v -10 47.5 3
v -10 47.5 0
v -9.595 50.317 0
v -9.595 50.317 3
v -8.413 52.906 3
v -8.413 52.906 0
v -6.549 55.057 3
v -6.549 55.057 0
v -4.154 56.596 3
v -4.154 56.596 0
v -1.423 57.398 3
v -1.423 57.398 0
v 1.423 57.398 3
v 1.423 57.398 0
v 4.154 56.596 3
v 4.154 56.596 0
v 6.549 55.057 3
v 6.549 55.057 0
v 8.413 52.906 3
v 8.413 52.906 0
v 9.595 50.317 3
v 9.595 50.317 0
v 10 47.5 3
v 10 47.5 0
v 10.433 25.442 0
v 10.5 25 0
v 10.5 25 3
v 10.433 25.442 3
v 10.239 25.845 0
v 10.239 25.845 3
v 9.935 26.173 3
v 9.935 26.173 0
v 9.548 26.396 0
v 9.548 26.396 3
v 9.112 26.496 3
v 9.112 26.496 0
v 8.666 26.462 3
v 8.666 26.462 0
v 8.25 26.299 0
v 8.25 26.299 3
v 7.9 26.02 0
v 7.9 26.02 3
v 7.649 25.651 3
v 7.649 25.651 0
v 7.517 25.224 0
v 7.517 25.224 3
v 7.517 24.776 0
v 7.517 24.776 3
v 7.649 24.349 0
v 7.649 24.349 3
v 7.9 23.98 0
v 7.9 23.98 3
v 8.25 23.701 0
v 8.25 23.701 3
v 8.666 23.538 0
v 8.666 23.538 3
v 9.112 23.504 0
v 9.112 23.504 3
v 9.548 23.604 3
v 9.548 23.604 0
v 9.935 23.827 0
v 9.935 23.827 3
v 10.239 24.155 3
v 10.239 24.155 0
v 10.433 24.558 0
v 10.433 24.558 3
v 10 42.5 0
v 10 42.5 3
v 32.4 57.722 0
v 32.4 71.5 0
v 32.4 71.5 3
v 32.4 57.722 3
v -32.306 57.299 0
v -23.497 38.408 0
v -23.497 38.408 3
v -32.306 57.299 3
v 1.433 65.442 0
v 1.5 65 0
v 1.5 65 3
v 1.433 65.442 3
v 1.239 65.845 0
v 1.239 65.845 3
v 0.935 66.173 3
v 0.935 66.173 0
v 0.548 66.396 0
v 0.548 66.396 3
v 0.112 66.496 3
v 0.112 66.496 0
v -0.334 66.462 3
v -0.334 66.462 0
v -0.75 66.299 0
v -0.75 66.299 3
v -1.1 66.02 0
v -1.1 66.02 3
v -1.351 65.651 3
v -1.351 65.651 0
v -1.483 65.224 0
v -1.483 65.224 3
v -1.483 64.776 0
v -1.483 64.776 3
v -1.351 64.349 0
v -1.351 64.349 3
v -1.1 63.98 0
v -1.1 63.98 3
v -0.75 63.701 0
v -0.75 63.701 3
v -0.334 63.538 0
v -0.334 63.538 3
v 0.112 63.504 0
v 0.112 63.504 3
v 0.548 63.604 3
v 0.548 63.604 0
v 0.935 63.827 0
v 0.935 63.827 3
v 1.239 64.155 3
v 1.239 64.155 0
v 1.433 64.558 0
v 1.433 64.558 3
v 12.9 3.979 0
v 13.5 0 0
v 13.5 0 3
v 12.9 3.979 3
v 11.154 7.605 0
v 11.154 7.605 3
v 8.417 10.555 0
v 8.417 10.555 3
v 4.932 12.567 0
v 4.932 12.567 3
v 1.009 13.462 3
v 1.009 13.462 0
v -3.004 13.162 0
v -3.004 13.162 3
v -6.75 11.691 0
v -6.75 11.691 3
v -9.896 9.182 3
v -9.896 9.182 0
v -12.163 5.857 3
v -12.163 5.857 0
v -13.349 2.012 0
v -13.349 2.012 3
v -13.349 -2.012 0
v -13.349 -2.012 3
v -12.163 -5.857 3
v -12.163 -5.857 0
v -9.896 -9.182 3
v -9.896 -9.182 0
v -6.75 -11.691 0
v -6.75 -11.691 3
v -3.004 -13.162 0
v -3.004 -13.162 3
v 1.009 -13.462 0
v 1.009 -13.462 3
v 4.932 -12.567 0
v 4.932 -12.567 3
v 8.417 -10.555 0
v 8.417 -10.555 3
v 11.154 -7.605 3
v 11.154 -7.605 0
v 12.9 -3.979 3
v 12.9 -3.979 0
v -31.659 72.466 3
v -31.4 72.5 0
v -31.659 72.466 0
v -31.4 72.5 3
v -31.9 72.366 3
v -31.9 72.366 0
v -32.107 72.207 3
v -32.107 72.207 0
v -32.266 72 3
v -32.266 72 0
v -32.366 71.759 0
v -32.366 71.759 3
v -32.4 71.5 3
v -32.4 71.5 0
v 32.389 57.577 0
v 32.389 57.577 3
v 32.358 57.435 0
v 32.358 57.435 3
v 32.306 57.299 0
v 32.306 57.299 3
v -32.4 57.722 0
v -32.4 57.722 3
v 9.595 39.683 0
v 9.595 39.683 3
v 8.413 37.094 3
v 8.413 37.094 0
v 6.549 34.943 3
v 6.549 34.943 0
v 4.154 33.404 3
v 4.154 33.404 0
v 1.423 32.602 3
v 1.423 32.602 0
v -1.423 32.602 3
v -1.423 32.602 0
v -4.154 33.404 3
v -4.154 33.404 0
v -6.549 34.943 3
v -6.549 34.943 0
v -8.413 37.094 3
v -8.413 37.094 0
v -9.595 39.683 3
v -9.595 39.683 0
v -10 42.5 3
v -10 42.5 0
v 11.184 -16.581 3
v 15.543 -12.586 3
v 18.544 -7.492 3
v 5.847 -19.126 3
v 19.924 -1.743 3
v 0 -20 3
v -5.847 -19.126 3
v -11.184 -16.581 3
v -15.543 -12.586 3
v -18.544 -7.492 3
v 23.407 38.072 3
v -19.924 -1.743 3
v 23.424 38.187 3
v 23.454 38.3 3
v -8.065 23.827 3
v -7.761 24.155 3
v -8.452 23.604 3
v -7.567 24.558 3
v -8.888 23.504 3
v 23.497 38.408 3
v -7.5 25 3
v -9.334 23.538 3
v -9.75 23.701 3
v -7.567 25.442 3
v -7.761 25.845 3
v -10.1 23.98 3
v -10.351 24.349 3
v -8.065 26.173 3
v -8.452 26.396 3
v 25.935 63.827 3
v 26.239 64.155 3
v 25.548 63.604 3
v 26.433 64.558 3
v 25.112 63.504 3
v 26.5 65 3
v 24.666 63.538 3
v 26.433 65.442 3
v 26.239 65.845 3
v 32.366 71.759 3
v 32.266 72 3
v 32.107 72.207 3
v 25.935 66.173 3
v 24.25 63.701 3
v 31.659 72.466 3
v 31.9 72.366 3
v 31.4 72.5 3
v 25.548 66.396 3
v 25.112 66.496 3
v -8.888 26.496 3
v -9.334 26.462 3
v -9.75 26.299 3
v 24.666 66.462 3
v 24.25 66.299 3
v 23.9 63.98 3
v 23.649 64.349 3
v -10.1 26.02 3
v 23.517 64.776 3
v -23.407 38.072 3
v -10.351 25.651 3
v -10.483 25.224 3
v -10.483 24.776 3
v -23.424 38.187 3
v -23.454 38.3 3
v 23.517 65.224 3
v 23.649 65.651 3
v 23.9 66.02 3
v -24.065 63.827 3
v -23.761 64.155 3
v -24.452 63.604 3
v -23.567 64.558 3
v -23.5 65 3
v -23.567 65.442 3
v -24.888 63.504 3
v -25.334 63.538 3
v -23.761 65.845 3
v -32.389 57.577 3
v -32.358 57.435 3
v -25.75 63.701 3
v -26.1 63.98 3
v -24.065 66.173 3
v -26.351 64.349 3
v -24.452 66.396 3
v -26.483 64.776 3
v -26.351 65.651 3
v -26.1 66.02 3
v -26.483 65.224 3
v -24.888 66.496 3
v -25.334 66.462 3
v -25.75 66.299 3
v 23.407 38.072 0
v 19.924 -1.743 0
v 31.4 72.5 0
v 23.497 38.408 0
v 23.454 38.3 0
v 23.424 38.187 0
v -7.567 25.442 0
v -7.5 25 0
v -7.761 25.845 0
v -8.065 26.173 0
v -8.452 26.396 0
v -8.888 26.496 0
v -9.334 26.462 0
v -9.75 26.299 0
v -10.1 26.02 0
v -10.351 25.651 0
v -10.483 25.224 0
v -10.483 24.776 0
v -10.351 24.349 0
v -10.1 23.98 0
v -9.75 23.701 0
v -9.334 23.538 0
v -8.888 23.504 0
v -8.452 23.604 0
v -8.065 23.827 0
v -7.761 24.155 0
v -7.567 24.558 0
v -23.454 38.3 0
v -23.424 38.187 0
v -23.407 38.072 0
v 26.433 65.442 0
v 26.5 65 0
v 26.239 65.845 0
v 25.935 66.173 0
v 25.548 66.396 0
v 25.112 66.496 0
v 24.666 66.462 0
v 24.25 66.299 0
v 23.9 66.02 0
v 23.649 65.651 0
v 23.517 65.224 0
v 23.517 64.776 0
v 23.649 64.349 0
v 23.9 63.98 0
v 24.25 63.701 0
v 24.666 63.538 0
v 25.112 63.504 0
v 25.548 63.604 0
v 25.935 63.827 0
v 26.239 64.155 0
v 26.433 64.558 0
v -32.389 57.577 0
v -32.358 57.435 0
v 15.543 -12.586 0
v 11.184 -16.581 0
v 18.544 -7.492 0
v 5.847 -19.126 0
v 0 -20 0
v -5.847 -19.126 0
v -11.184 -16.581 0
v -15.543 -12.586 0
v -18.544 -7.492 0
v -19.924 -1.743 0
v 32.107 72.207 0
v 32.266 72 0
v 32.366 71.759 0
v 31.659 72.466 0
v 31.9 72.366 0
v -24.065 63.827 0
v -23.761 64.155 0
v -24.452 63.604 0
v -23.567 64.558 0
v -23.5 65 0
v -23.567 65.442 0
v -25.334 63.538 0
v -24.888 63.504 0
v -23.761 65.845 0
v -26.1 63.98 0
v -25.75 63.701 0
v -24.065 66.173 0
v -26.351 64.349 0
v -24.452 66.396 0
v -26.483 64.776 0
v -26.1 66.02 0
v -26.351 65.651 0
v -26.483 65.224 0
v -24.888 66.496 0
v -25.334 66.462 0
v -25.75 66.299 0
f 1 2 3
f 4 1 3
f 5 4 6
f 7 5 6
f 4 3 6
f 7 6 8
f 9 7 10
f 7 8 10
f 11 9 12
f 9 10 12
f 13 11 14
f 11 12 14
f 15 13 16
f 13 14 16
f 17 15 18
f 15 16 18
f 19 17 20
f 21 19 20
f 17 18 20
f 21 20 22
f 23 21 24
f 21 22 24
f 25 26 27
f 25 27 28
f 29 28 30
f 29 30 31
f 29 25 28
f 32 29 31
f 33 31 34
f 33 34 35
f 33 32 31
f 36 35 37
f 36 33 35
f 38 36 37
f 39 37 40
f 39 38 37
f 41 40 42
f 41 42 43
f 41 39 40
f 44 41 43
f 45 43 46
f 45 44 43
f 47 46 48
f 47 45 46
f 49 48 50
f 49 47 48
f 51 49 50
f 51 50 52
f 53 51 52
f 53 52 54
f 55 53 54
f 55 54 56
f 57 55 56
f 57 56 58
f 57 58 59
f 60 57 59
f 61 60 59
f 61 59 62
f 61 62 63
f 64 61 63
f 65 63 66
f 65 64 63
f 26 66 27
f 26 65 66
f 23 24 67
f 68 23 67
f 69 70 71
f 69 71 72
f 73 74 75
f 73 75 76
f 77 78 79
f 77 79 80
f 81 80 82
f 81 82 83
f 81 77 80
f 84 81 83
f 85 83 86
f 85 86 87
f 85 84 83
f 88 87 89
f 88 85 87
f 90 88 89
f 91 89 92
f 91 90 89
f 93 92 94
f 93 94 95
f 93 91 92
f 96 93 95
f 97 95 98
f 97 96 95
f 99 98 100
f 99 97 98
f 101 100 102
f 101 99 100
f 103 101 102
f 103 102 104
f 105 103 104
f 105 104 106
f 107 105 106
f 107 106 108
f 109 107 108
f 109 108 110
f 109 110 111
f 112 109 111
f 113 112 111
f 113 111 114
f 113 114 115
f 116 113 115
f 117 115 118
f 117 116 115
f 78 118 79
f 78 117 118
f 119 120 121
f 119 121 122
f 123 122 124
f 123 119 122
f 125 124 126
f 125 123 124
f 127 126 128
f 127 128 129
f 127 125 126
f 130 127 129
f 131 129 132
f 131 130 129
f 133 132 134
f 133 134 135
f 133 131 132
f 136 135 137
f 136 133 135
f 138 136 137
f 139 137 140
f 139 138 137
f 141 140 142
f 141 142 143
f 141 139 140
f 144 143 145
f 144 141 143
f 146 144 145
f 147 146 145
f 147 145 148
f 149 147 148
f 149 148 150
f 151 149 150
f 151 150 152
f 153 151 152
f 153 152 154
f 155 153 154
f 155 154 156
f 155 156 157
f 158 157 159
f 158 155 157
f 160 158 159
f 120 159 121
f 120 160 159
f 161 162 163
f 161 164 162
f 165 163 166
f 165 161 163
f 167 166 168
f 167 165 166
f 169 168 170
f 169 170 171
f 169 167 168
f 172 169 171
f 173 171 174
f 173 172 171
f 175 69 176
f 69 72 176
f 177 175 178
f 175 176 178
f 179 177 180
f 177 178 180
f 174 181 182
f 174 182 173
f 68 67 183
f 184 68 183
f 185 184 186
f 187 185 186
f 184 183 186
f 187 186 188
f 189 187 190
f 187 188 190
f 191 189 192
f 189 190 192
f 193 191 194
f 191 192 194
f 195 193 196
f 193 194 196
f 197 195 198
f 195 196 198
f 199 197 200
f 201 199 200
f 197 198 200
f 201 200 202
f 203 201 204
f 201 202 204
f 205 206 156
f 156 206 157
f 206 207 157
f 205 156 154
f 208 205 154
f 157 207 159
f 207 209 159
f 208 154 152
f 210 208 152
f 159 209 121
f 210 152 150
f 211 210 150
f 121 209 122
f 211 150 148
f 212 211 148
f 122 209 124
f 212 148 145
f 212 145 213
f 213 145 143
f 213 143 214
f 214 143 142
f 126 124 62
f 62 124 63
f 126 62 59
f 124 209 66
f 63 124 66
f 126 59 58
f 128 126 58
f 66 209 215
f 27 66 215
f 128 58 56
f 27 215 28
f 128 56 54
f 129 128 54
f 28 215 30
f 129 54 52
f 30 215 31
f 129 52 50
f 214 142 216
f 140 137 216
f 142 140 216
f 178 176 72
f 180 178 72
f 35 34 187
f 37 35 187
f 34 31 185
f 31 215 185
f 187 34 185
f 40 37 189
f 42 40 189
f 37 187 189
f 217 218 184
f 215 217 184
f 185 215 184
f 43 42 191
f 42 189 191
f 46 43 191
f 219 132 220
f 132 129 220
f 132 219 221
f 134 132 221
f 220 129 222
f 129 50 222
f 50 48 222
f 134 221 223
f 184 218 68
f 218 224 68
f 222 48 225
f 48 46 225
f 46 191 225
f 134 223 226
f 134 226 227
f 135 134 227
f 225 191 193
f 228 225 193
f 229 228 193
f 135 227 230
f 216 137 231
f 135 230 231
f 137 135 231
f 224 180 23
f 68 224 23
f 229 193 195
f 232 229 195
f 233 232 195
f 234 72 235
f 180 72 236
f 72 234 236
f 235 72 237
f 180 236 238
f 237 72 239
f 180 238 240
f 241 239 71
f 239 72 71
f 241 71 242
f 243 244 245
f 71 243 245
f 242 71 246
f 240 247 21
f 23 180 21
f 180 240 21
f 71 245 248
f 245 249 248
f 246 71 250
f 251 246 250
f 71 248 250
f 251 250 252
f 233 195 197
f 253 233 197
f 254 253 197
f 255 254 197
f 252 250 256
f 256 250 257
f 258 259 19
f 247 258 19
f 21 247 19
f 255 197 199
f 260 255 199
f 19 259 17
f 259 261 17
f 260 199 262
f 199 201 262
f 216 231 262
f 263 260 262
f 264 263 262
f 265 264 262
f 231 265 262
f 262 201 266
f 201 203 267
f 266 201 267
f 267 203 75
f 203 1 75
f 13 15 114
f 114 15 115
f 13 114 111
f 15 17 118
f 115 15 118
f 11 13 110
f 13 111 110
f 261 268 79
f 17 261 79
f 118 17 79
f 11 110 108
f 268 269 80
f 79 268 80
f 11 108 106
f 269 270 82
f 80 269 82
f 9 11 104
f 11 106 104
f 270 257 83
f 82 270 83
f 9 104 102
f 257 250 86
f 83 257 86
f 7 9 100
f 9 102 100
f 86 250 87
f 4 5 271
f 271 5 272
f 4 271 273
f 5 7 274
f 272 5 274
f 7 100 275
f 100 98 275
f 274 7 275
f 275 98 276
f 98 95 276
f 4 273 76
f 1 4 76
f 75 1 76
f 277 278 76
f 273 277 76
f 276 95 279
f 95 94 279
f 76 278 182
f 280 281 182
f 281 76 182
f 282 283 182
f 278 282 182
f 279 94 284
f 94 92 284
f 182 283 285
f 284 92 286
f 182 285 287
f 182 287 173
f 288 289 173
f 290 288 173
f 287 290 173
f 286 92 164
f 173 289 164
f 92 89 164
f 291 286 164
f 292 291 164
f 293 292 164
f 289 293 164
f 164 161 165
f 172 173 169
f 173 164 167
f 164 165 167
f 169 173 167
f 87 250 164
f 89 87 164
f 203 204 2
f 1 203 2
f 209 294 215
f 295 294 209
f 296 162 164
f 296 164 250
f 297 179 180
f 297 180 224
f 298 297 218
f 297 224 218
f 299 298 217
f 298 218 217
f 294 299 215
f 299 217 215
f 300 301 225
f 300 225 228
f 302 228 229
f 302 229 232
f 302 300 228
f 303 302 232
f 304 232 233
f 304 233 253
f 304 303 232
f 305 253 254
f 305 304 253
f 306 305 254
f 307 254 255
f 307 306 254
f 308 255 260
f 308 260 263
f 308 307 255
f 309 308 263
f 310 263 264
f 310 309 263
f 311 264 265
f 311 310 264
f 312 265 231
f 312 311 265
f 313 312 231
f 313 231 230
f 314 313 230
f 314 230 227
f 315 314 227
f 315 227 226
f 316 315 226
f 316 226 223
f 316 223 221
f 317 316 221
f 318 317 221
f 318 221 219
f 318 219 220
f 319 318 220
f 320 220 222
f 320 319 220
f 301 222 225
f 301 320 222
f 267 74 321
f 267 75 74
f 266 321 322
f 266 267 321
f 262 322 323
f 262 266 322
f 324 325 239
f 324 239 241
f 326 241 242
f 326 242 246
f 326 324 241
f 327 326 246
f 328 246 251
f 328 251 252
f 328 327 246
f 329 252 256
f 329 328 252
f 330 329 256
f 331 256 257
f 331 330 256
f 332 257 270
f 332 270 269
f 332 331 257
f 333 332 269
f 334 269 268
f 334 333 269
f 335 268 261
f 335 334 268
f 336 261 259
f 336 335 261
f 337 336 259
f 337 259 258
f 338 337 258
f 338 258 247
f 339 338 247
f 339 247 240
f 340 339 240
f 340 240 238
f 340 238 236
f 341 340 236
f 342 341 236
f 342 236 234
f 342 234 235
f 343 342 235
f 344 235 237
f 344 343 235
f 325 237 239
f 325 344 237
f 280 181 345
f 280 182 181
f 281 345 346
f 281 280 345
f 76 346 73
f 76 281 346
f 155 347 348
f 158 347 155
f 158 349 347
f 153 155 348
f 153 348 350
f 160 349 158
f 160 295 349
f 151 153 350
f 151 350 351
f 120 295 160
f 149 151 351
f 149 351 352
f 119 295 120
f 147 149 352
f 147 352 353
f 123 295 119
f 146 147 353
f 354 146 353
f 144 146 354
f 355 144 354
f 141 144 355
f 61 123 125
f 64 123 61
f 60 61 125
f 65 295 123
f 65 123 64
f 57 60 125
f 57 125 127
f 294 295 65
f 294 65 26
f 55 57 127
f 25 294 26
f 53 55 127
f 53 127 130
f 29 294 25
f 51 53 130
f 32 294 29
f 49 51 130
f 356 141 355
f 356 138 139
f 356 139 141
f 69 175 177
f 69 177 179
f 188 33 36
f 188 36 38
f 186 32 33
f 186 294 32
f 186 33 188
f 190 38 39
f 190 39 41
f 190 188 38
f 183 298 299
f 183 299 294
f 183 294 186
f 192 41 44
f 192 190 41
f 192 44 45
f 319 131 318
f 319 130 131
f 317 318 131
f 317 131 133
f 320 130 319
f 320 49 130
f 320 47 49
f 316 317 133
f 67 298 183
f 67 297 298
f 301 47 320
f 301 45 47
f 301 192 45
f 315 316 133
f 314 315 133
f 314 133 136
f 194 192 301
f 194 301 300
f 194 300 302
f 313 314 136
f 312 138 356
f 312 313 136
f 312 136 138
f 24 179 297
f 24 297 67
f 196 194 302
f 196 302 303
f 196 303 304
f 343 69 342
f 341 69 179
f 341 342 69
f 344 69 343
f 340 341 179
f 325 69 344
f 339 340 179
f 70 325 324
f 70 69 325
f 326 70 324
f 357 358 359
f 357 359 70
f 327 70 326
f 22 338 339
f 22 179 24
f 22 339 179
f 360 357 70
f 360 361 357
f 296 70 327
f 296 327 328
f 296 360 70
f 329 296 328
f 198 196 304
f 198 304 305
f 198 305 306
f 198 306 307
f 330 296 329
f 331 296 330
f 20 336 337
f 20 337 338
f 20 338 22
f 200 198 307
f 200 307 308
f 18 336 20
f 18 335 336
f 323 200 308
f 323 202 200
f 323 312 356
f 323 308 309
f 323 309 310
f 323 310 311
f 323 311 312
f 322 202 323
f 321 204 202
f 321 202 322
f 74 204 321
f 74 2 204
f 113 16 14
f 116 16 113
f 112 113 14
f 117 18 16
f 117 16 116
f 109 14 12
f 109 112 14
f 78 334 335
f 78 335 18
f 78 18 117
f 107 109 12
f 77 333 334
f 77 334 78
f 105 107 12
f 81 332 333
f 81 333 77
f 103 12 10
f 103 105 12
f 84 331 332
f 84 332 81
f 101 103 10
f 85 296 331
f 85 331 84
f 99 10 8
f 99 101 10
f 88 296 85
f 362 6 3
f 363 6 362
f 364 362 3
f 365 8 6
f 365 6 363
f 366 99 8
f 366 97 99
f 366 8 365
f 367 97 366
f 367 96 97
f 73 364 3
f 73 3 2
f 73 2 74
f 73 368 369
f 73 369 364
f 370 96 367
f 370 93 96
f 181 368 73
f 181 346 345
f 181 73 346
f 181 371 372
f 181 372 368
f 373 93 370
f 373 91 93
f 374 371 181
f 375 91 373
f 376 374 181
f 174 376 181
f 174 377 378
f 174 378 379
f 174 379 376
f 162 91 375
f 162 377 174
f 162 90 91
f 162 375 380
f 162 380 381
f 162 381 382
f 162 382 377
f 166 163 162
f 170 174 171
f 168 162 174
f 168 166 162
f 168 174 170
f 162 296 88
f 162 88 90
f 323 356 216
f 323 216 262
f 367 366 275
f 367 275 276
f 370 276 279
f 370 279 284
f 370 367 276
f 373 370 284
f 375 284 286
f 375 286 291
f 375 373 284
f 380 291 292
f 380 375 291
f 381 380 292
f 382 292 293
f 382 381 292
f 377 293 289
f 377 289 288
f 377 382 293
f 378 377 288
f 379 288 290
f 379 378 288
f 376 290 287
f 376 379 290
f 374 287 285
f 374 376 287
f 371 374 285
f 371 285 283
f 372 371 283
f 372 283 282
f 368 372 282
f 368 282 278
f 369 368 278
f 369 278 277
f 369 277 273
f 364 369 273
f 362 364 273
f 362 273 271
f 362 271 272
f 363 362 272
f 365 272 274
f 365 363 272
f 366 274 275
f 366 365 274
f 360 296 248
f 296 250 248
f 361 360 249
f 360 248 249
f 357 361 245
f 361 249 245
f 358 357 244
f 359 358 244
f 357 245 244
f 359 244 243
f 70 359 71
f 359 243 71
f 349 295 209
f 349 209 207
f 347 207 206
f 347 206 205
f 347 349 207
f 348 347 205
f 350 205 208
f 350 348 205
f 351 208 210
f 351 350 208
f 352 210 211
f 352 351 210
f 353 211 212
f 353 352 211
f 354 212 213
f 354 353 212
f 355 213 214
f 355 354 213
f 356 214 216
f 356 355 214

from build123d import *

# Parameters (mm, degrees)
SKETCH_1_R      = 1.5
SKETCH_1_R_2    = 13.5
EXTRUDE_1_DEPTH = 3
FILLET_2_R      = 1


with BuildPart() as part:
    # 草图1 → 凸台-拉伸1 (new body)
    with BuildSketch(Plane.XY):
        with BuildLine():
            Line((-32.4, 72.5), (32.4, 72.5))
            Line((32.4, 72.5), (32.4, 57.5))
            Line((32.4, 57.5), (23.422667354, 38.248048013))
            Line((23.422667354, 38.248048013), (19.923893962, -1.743114855))
            ThreePointArc((19.923893962, -1.743114855), (0, -20), (-19.923893962, -1.743114855))
            Line((-19.923893962, -1.743114855), (-23.422667354, 38.248048013))
            Line((-23.422667354, 38.248048013), (-32.4, 57.5))
            Line((-32.4, 57.5), (-32.4, 72.5))
        make_face()
        with Locations((25, 65)):
            Circle(SKETCH_1_R, mode=Mode.SUBTRACT)
        with Locations((-25, 65)):
            Circle(SKETCH_1_R, mode=Mode.SUBTRACT)
        with Locations((0, 65)):
            Circle(SKETCH_1_R, mode=Mode.SUBTRACT)
        Circle(SKETCH_1_R_2, mode=Mode.SUBTRACT)
        with Locations((-9, 25)):
            Circle(SKETCH_1_R, mode=Mode.SUBTRACT)
        with Locations((9, 25)):
            Circle(SKETCH_1_R, mode=Mode.SUBTRACT)
        with BuildLine():
            Line((10, 47.5), (10, 42.5))
            ThreePointArc((10, 42.5), (0, 32.5), (-10, 42.5))
            Line((-10, 42.5), (-10, 47.5))
            ThreePointArc((-10, 47.5), (0, 57.5), (10, 47.5))
        make_face(mode=Mode.SUBTRACT)
    extrude(amount=EXTRUDE_1_DEPTH)

    # 圆角2
    fillet_2_edges = [part.edges().sort_by_distance(p)[0] for p in [
        (23.422667354, 38.248048013, 1.5),
        (-23.422667354, 38.248048013, 1.5),
        (-32.4, 57.5, 1.5),
        (-32.4, 72.5, 1.5),
        (32.4, 72.5, 1.5),
        (32.4, 57.5, 1.5),
    ]]
    fillet(fillet_2_edges, radius=FILLET_2_R)


solid = part.part
